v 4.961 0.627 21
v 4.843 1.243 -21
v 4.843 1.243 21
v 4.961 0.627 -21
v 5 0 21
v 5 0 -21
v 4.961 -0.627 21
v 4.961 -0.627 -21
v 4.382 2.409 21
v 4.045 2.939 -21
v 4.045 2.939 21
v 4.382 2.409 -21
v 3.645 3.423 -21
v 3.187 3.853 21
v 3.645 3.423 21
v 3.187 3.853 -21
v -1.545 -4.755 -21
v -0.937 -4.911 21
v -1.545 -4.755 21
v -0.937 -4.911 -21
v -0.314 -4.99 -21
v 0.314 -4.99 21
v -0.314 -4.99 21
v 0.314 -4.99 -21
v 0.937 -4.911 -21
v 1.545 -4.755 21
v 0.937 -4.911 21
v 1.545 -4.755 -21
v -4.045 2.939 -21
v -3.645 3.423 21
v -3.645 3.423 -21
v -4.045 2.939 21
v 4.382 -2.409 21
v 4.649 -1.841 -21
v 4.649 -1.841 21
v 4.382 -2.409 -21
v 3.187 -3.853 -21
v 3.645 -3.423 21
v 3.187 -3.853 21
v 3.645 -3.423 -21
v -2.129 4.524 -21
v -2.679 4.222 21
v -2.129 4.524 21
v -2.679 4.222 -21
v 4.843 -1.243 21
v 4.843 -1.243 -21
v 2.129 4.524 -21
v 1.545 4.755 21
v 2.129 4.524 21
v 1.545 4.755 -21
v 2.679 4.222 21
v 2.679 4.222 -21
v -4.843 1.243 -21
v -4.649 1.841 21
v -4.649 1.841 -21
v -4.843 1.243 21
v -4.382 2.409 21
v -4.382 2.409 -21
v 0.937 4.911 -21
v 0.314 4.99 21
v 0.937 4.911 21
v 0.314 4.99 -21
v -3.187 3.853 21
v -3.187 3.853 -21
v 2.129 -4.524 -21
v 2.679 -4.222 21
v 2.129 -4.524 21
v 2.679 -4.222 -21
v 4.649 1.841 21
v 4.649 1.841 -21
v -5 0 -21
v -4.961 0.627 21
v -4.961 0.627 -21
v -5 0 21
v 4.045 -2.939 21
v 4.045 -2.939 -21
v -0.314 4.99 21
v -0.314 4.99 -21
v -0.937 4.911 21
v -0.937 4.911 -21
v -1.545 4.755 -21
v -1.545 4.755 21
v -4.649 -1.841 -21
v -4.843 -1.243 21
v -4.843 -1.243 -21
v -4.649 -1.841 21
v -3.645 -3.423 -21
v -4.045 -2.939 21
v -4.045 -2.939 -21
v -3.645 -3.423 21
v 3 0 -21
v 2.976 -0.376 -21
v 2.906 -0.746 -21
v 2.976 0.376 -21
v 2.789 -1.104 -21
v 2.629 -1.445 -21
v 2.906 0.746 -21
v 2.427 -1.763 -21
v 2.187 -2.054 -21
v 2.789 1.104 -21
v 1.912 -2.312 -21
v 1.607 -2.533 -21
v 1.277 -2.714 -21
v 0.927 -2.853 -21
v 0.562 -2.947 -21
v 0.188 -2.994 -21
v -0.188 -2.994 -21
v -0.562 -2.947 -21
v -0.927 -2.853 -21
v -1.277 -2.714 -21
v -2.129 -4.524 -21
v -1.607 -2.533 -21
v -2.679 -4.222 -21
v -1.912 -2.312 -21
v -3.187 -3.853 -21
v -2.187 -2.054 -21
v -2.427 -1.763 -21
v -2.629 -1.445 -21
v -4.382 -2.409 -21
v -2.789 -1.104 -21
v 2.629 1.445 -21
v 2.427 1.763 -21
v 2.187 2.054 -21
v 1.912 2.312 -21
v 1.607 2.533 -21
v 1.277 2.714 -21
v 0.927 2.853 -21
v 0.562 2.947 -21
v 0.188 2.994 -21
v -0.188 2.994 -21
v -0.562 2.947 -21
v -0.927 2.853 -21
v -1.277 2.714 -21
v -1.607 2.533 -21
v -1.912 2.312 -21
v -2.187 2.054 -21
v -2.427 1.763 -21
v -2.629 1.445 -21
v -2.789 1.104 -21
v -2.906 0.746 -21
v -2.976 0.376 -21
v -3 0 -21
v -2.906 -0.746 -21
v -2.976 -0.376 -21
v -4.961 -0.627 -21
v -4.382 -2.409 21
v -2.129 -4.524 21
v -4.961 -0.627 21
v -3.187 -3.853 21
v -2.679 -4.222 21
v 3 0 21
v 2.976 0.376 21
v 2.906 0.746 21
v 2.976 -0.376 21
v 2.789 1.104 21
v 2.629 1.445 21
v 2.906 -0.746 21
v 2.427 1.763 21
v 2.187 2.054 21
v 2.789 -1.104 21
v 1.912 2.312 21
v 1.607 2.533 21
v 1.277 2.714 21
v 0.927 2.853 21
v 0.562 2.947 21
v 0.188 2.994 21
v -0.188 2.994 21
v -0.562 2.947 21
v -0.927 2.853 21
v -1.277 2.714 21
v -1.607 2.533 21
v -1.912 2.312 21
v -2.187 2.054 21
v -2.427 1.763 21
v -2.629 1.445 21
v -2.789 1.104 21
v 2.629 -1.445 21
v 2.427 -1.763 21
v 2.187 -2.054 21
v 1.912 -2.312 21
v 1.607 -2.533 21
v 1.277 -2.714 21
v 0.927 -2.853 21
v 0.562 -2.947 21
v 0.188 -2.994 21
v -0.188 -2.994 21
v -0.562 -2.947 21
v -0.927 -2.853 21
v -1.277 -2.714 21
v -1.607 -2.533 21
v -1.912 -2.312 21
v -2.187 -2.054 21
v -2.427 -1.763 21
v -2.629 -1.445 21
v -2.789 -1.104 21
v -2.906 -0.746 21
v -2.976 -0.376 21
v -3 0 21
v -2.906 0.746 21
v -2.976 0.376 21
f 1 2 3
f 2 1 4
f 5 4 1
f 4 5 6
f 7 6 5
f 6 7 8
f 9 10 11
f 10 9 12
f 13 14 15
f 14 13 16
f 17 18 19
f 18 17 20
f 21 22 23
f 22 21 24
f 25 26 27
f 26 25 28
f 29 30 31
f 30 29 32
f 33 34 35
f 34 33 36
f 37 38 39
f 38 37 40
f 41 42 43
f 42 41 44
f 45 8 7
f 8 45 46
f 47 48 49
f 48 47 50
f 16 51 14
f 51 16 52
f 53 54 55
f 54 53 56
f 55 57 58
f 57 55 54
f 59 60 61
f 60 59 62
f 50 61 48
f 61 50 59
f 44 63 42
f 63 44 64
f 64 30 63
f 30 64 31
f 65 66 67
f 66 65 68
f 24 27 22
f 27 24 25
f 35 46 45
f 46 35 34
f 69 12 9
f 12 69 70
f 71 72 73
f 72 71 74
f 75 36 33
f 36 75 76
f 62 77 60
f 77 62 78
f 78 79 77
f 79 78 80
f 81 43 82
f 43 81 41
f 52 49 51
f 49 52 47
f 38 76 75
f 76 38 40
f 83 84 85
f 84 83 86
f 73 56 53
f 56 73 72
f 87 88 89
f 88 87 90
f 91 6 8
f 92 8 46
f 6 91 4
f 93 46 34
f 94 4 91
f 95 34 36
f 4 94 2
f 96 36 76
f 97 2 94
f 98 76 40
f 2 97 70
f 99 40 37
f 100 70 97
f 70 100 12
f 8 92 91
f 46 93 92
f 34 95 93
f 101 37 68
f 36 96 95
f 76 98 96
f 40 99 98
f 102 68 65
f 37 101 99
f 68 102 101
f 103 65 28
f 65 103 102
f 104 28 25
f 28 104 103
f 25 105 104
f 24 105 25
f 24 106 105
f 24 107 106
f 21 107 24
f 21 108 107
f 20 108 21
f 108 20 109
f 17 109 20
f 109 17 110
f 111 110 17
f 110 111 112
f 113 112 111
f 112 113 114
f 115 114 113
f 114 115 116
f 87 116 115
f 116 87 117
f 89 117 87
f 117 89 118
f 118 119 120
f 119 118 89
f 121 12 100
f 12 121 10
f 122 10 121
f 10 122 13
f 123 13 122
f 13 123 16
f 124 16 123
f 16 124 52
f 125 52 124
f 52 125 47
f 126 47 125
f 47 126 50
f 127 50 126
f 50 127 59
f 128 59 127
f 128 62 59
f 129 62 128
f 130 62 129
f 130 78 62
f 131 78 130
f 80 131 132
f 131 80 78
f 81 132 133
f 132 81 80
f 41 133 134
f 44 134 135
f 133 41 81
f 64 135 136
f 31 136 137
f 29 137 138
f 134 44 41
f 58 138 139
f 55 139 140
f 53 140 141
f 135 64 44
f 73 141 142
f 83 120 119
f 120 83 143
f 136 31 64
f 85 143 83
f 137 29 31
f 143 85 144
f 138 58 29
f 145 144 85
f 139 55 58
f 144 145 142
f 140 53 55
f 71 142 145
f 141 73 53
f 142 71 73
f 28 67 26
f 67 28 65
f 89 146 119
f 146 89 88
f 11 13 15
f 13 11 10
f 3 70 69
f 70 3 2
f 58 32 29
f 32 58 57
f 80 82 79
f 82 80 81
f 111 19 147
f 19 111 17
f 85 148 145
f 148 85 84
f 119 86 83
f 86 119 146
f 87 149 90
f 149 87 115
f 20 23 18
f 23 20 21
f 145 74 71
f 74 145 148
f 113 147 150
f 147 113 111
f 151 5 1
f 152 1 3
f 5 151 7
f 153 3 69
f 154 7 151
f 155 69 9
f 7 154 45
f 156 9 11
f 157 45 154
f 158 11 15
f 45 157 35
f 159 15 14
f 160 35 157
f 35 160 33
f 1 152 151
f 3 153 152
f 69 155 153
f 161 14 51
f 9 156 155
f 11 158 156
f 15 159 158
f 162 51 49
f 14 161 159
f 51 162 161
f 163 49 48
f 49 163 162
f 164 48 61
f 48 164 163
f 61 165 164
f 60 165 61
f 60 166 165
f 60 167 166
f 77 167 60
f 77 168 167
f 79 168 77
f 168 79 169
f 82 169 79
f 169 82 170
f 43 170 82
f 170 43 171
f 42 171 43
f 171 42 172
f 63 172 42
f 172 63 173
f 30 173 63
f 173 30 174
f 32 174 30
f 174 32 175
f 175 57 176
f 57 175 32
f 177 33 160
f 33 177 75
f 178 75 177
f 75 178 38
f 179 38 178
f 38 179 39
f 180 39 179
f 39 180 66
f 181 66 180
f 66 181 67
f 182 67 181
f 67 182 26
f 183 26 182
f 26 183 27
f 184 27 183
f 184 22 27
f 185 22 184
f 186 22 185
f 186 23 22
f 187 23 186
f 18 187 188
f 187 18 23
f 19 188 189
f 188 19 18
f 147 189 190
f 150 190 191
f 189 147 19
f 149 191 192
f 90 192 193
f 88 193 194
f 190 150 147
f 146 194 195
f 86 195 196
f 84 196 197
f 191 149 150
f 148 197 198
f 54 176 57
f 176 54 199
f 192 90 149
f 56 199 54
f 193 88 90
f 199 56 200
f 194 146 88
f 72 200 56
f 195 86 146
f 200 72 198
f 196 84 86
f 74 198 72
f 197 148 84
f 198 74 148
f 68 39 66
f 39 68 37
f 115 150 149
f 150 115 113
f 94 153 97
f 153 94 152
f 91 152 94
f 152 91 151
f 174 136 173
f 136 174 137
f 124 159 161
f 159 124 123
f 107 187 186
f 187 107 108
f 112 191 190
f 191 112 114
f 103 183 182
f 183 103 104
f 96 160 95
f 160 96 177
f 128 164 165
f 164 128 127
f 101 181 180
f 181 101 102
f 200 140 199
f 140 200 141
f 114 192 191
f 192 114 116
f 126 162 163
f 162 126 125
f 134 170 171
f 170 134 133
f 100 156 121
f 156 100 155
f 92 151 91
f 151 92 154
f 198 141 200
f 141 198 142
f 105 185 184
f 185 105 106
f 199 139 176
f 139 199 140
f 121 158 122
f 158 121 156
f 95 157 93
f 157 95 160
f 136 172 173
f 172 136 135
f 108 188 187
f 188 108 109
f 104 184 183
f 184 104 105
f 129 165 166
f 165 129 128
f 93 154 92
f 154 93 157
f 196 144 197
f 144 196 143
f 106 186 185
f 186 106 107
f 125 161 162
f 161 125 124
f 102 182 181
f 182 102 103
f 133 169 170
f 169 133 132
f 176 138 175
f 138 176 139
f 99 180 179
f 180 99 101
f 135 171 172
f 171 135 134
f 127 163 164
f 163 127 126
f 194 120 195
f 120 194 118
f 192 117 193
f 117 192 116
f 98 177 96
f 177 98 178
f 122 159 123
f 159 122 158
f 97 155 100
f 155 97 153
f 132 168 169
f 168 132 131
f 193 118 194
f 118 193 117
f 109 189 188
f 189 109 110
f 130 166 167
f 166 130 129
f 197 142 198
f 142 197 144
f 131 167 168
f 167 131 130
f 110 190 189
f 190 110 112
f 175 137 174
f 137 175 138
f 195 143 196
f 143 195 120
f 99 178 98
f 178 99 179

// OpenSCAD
$fn = 50;


difference() {
	union() {
		translate(v = [0, 0, -21.0000000000]) {
			cylinder(h = 42, r = 5.0000000000);
		}
	}
	union() {
		translate(v = [0, 0, -100.0000000000]) {
			cylinder(h = 200, r = 3.0000000000);
		}
	}
}
